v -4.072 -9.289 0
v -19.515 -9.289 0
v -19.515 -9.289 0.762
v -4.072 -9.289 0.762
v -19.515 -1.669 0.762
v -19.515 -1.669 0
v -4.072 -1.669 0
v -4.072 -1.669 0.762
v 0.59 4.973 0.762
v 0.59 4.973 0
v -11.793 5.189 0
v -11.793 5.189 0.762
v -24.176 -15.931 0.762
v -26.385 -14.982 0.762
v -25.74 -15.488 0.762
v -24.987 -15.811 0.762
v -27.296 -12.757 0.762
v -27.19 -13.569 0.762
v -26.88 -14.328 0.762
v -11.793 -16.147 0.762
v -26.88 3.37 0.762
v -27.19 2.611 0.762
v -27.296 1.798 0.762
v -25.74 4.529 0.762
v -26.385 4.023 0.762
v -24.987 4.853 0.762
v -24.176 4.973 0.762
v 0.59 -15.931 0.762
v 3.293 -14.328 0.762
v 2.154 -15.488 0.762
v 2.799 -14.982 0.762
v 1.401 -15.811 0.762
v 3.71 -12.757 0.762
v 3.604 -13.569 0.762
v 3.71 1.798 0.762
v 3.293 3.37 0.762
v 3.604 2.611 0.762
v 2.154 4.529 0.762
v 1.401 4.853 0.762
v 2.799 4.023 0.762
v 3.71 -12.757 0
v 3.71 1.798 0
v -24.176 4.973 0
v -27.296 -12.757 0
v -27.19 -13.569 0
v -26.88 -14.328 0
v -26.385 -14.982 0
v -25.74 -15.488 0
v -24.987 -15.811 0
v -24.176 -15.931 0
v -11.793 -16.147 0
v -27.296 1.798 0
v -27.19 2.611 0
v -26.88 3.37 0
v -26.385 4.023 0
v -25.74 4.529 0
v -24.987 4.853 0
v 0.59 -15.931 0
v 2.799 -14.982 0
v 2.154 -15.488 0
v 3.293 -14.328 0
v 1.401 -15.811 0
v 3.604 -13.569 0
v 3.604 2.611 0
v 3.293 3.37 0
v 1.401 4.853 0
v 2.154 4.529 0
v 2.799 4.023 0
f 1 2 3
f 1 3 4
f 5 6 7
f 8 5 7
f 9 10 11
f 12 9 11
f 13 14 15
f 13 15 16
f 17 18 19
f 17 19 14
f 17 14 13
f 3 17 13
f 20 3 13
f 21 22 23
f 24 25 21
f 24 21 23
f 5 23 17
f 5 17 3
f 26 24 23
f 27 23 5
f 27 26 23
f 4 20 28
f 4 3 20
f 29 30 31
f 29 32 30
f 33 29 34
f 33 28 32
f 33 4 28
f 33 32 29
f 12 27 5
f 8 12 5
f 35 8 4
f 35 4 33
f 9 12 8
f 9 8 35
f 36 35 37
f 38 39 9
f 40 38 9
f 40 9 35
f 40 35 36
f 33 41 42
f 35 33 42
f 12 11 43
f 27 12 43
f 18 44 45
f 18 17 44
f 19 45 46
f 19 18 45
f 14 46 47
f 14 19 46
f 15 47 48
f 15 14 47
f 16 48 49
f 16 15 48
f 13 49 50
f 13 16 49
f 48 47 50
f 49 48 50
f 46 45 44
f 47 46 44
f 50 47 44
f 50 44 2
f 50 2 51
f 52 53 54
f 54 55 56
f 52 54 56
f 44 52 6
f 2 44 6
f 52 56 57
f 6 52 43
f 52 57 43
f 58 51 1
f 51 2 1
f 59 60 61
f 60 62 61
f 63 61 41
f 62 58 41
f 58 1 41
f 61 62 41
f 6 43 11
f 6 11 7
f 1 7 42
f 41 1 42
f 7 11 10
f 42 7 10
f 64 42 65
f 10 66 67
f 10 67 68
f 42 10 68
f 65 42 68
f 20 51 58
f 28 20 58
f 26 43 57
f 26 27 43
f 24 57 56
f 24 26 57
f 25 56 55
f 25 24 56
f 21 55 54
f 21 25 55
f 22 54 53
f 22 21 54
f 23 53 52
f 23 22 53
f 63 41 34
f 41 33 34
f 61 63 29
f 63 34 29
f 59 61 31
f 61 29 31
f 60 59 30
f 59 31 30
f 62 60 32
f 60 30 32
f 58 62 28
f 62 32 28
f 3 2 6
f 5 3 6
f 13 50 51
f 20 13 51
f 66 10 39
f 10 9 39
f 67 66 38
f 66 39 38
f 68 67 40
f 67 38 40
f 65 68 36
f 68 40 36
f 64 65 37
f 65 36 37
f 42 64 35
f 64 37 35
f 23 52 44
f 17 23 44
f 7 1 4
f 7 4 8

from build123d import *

# Parameters (mm, degrees)
SKETCH1_W      = 15.4432
SKETCH1_H      = 7.62
EXTRUDE1_DEPTH = 0.762
FILLET1_R      = 3.175


with BuildPart() as part:
    # Sketch1 → Extrude1 (new body)
    with BuildSketch(Plane.XY):
        Polygon((3.709668038, 4.91810583), (-11.793104343, 5.188707728), (-27.295876724, 4.91810583), (-27.295876724, -15.876690374), (-11.793104343, -16.147292272), (3.709668038, -15.876690374), align=None)
        with Locations((-11.793104343, -5.479292272)):
            Rectangle(SKETCH1_W, SKETCH1_H, mode=Mode.SUBTRACT)
    extrude(amount=EXTRUDE1_DEPTH)

    # Fillet1
    fillet1_edges = [part.edges().sort_by_distance(p)[0] for p in [
        (3.709668038, -15.876690374, 0.381),
        (-27.295876724, -15.876690374, 0.381),
        (-27.295876724, 4.91810583, 0.381),
        (3.709668038, 4.91810583, 0.381),
    ]]
    fillet(fillet1_edges, radius=FILLET1_R)


solid = part.part
